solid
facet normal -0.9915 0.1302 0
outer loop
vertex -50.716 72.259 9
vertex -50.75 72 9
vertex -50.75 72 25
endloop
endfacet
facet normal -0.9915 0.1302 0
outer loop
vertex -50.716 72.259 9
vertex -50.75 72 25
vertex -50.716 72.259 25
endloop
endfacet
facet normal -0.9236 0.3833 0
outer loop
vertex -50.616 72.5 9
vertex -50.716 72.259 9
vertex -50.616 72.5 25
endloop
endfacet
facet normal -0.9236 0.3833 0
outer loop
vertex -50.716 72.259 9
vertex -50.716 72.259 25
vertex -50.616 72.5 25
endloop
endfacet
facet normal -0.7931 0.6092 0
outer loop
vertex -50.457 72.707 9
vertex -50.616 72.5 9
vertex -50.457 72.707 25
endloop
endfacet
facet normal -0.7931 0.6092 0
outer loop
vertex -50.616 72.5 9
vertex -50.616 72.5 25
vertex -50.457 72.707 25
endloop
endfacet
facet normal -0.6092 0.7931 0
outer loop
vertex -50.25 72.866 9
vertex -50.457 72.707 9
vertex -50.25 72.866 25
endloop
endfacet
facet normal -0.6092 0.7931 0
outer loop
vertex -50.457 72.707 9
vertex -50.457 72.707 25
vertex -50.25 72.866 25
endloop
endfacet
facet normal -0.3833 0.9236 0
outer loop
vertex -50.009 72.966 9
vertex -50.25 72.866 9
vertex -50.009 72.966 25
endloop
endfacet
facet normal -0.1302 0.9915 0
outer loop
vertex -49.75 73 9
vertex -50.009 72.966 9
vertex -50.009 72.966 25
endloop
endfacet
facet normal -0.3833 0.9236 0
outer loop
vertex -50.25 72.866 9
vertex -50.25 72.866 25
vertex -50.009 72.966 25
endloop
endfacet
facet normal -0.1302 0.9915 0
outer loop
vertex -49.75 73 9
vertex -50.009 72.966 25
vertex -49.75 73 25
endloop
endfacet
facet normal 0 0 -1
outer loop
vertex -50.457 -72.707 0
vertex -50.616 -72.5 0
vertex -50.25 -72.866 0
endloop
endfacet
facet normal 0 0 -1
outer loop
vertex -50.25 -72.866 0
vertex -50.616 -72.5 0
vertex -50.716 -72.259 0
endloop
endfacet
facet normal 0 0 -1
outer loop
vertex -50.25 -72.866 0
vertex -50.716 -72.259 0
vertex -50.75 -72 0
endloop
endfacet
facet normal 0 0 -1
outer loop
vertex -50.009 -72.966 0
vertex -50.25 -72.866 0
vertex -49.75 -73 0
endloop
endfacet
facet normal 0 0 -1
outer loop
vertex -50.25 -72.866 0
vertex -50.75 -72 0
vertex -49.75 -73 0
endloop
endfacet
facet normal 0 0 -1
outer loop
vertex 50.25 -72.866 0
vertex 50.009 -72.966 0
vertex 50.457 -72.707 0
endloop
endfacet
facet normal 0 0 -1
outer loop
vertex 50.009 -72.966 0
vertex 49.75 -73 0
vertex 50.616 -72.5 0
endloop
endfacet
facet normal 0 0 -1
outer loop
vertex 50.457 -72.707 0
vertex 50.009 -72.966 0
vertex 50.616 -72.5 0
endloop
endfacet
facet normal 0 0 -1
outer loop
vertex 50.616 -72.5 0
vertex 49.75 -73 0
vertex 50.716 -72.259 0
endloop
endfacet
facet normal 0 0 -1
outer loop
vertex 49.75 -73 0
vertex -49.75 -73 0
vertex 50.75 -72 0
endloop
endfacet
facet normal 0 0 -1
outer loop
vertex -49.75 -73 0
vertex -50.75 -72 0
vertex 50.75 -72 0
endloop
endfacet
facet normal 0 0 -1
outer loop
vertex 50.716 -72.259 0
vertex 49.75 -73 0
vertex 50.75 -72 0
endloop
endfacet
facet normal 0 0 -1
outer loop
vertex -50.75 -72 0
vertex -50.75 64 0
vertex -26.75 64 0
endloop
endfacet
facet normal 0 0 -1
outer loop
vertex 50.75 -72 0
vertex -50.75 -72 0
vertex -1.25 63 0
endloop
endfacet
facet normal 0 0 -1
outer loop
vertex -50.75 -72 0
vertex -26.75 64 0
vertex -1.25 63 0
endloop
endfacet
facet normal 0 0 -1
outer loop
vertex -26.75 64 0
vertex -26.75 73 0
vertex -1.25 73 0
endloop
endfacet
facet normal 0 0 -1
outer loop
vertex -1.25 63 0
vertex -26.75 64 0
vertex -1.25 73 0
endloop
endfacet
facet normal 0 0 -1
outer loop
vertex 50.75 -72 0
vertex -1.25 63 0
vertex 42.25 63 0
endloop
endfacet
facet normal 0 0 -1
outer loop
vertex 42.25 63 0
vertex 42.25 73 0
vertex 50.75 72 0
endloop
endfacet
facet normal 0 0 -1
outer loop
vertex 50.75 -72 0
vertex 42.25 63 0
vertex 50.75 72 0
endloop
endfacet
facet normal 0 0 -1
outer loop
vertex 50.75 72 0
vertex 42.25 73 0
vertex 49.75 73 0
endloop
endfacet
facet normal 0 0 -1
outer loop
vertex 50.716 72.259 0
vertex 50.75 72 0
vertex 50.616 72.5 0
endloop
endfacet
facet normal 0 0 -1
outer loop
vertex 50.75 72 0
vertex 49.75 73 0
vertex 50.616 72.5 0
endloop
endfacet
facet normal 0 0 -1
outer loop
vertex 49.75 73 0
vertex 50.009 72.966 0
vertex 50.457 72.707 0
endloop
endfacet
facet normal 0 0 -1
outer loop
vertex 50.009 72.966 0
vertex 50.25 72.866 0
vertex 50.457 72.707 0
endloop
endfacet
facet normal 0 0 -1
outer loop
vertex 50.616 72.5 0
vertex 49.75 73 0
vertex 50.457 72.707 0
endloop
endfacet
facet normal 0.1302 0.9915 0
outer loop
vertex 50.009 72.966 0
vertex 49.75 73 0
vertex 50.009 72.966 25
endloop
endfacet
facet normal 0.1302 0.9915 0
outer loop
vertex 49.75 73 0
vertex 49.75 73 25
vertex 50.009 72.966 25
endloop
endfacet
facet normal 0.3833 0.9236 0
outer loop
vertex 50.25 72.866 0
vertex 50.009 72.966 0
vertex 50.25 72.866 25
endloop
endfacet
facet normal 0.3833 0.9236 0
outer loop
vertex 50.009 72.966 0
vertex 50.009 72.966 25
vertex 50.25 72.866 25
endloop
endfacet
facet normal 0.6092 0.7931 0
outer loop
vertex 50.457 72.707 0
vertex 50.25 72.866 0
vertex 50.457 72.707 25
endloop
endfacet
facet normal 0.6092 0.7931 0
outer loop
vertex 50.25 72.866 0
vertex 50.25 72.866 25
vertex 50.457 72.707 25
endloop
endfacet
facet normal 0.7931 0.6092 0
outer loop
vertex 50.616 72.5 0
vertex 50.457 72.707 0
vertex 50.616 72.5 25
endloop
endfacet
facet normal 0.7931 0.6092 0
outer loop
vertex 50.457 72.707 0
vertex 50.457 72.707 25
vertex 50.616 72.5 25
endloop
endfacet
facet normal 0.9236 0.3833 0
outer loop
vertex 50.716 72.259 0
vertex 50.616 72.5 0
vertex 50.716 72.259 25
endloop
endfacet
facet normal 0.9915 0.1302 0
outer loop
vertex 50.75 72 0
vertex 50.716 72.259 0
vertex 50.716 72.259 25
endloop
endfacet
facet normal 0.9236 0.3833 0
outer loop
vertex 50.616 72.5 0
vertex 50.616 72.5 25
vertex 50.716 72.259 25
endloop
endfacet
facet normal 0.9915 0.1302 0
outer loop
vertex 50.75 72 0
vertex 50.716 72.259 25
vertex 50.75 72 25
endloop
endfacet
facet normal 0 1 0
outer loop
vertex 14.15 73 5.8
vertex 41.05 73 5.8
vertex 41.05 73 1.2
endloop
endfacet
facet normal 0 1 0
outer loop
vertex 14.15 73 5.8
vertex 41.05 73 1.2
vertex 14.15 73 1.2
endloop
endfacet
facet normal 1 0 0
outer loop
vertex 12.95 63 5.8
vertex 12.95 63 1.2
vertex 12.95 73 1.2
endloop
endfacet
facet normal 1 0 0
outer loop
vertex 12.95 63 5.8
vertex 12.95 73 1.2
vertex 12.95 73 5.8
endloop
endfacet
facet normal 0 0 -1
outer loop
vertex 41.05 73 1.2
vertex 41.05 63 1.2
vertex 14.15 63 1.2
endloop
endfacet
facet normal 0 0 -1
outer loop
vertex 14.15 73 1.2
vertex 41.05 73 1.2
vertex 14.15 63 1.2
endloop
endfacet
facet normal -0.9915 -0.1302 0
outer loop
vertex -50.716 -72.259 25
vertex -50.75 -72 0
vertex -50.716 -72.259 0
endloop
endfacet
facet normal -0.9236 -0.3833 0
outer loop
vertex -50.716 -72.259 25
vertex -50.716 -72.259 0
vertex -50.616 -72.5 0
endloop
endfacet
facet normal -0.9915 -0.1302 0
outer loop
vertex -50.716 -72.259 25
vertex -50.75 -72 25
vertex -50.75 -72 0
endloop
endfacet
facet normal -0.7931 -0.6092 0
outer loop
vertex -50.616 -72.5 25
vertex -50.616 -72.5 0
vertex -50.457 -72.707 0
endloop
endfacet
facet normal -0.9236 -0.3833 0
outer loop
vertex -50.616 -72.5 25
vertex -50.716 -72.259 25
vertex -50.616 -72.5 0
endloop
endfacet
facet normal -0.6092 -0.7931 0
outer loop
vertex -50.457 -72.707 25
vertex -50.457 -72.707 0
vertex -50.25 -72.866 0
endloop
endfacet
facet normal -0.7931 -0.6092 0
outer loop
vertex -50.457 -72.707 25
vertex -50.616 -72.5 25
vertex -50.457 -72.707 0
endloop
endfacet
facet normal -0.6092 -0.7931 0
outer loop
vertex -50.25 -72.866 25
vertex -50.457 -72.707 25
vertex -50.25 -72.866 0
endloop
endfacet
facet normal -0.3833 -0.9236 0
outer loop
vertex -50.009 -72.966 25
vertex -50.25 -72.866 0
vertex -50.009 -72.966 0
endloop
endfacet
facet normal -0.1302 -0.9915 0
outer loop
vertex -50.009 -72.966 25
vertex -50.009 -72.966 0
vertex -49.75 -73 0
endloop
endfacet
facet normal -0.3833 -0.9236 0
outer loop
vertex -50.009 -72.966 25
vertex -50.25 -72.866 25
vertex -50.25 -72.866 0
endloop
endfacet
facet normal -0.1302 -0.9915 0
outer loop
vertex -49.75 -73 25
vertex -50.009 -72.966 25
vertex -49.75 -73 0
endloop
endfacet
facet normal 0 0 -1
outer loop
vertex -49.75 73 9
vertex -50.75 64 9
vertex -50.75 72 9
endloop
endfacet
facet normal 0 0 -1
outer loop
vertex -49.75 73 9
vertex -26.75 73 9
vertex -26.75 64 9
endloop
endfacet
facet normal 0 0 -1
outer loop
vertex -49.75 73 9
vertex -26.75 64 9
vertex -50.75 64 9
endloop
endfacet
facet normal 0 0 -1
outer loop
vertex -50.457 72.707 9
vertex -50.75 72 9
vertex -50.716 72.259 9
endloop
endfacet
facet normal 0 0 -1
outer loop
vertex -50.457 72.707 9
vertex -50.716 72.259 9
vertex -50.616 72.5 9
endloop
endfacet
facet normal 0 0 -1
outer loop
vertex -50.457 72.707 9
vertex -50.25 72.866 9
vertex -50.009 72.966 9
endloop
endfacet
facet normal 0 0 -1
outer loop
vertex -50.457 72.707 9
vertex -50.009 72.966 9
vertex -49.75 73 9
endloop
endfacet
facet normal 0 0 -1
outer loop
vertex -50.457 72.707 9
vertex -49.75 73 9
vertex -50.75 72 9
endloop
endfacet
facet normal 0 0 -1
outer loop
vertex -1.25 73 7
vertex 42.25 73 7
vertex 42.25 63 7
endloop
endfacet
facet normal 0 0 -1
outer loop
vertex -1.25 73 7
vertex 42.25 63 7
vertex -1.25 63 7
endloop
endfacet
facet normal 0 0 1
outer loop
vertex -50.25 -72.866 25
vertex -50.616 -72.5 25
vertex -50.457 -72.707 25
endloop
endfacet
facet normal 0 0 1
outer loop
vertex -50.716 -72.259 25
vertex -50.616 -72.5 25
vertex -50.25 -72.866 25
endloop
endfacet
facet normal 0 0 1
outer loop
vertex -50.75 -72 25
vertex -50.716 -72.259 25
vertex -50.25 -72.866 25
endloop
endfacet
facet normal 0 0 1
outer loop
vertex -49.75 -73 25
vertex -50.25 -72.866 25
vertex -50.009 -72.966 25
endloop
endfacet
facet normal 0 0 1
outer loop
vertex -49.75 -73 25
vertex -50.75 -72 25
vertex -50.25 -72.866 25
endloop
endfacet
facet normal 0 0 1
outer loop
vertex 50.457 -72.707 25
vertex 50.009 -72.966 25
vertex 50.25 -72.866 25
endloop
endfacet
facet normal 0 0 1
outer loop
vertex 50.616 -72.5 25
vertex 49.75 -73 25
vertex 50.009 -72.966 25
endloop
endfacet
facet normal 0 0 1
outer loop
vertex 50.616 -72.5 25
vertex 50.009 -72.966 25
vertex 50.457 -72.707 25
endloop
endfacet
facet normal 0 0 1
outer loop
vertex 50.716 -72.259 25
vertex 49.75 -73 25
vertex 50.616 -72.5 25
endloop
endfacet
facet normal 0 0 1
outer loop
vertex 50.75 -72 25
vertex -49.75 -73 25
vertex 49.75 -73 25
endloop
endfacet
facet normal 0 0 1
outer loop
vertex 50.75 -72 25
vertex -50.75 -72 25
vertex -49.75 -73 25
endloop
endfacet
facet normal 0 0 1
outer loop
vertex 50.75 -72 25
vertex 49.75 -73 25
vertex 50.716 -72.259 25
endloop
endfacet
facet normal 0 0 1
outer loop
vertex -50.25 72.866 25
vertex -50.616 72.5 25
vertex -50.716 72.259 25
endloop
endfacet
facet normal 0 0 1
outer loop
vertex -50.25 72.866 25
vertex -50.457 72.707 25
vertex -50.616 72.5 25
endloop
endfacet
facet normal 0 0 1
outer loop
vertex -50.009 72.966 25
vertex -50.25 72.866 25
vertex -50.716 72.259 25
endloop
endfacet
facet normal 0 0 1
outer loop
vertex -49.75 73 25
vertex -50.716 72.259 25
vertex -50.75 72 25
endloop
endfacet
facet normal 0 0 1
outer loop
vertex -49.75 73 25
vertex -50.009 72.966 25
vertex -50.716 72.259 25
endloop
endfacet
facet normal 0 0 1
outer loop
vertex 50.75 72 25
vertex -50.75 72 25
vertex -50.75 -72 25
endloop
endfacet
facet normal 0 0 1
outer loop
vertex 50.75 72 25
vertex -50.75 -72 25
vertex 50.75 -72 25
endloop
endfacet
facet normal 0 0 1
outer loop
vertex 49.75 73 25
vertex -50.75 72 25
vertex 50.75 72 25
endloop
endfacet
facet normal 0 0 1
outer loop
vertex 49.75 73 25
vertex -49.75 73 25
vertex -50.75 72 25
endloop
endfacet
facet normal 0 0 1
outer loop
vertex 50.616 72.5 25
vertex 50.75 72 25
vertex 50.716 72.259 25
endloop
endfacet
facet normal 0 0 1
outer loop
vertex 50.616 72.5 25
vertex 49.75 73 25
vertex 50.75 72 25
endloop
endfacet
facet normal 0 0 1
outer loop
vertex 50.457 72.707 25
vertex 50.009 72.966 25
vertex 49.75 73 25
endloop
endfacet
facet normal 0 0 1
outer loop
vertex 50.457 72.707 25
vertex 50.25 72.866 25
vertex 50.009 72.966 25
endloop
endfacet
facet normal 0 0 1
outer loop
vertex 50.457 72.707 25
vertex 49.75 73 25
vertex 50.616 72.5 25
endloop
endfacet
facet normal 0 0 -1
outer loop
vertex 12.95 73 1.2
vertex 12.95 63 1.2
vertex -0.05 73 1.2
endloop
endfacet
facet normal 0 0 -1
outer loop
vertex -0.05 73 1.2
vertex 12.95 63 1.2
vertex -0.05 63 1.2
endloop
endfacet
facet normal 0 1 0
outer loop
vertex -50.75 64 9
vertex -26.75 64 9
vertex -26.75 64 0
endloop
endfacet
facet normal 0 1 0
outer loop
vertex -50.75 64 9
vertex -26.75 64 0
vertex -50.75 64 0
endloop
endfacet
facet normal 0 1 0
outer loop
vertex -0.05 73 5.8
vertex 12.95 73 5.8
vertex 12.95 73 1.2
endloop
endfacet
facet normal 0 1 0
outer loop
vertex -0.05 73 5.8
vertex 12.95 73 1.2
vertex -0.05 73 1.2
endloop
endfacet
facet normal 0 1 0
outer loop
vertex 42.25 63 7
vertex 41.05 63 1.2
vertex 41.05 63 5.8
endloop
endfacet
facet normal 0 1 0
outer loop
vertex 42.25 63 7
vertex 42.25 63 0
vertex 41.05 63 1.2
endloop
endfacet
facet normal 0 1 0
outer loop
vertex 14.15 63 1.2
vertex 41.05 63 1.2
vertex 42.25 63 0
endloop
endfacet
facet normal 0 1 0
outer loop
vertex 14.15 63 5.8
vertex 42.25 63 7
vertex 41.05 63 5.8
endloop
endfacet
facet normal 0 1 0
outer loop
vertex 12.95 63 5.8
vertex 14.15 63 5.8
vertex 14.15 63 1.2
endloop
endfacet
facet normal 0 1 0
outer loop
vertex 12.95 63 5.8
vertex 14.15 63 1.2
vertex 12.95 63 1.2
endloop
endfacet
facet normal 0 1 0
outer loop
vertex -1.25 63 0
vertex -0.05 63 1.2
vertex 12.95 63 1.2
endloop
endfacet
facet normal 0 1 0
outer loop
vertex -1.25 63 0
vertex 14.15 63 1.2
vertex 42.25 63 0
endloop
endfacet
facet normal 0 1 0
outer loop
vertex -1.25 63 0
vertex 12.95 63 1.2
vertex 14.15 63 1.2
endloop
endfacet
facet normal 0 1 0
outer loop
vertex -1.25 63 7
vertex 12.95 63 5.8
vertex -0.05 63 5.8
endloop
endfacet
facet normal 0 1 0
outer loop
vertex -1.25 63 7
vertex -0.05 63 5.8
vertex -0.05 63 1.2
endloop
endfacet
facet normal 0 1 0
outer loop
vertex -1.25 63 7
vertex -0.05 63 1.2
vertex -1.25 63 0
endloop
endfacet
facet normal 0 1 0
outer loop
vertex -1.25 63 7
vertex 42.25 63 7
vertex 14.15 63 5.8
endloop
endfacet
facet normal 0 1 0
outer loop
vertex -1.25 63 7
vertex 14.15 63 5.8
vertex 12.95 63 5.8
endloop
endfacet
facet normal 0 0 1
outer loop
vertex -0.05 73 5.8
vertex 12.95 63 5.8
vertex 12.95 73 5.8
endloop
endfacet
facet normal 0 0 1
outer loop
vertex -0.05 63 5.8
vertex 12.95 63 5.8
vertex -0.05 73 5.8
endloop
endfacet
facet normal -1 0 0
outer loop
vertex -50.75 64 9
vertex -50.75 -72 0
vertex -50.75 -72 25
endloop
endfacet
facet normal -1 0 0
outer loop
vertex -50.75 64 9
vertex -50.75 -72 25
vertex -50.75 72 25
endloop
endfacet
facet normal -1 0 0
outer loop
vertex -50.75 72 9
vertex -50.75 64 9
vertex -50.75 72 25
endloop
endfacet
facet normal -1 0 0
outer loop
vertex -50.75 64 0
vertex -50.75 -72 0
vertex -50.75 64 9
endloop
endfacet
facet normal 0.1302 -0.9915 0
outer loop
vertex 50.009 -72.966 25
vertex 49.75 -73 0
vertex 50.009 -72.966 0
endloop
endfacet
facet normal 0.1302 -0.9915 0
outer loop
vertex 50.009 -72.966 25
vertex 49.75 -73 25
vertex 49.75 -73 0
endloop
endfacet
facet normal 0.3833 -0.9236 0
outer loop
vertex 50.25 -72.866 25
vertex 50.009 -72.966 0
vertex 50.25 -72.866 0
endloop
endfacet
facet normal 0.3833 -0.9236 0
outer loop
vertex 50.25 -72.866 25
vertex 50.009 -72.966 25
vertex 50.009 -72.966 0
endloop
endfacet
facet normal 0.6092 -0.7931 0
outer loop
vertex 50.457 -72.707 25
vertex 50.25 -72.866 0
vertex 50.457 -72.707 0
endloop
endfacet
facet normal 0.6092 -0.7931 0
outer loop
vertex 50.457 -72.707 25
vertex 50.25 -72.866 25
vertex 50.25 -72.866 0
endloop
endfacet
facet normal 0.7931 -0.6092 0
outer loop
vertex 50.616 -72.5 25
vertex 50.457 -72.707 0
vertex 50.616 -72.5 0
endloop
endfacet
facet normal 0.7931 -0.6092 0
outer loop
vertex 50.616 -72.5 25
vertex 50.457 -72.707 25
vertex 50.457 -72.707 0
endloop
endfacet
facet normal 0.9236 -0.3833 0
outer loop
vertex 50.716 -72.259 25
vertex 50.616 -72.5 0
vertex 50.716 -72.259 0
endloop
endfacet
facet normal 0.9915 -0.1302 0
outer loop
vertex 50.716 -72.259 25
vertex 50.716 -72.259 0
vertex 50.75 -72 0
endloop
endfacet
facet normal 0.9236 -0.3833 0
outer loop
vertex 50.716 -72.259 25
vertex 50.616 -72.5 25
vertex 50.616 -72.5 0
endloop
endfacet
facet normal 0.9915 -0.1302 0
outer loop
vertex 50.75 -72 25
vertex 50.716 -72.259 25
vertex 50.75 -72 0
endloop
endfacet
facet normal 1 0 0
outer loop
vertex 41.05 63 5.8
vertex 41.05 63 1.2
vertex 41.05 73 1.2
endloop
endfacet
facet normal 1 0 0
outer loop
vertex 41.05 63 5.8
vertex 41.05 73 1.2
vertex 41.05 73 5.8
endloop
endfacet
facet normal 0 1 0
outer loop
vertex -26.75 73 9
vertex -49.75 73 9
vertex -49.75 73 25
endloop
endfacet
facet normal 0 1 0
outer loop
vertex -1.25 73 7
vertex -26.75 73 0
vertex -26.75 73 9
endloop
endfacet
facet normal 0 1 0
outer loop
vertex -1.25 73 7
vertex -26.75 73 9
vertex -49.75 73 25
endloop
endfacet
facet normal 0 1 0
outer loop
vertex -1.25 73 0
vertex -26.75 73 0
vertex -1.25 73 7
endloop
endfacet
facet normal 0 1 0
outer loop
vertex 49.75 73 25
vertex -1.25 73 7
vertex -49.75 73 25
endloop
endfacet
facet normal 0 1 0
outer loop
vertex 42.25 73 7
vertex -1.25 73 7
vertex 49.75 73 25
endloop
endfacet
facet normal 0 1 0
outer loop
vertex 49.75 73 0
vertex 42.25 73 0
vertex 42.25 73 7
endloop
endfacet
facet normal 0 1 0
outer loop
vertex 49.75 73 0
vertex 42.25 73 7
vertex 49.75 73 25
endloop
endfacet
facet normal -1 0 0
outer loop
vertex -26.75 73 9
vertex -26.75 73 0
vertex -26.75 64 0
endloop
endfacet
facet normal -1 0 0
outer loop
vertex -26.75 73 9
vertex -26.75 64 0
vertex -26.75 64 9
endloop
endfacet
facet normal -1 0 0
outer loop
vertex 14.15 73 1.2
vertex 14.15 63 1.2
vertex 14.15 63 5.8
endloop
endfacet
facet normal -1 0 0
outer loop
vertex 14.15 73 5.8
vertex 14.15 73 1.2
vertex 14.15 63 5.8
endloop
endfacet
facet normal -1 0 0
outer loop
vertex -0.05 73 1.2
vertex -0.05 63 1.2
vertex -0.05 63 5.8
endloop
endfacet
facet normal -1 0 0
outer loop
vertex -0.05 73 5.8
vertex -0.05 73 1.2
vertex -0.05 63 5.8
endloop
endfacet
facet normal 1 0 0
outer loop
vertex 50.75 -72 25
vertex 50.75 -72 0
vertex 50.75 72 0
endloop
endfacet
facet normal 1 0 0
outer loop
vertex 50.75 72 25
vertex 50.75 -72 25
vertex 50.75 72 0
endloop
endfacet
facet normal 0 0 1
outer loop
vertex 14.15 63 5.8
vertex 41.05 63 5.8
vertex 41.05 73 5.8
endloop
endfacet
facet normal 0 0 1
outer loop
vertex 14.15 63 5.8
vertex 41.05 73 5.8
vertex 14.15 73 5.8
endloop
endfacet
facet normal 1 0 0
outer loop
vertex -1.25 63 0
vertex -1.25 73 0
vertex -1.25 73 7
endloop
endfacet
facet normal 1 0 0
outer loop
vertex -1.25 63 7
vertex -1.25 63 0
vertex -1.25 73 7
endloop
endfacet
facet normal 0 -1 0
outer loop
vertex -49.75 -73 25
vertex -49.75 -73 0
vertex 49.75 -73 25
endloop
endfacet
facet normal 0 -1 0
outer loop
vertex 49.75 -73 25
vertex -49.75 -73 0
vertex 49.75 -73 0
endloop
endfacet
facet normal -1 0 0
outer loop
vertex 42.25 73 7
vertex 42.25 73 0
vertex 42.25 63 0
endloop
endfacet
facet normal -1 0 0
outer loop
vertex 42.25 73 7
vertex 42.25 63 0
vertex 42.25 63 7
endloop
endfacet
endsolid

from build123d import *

# Parameters (mm, degrees)
F0_W     = 101.5
F0_H     = 146
F1_DEPTH = 25
F2_W     = 24
F2_H     = 9
F3_DEPTH = 9
F4_R     = 1
F5_W     = 43.5
F5_H     = 7
F6_DEPTH = 10
F7_W     = 26.9
F7_H     = 4.6
F7_W_2   = 13
F8_DEPTH = 10


with BuildPart() as f1:
    # F0 (on Top) → F1 (new body)
    with BuildSketch(Plane.XY):
        Rectangle(F0_W, F0_H)
    extrude(amount=F1_DEPTH)

    # F2 (on face) → F3 (cut)
    with BuildSketch(Plane(origin=(0, 73, 0), x_dir=(-1, 0, 0), z_dir=(0, 1, 0))):
        with Locations((38.75, 4.5)):
            Rectangle(F2_W, F2_H)
    extrude(amount=-F3_DEPTH, mode=Mode.SUBTRACT)

    # F4
    f4_edges = [f1.edges().sort_by_distance(p)[0] for p in [
        (50.75, 73, 12.5),
        (-50.75, 73, 17),
        (-50.75, -73, 12.5),
        (50.75, -73, 12.5),
    ]]
    fillet(f4_edges, radius=F4_R)

    # F5 (on face) → F6 (cut)
    with BuildSketch(Plane(origin=(0, 73, 0), x_dir=(-1, 0, 0), z_dir=(0, 1, 0))):
        with Locations((-20.5, 3.5)):
            Rectangle(F5_W, F5_H)
    extrude(amount=-F6_DEPTH, mode=Mode.SUBTRACT)

    # F7 (on face) → F8 (join)
    with BuildSketch(Plane(origin=(0, 63, 0), x_dir=(-1, 0, 0), z_dir=(0, 1, 0))):
        with Locations((-27.6, 3.5)):
            Rectangle(F7_W, F7_H)
        with Locations((-6.45, 3.5)):
            Rectangle(F7_W_2, F7_H)
    extrude(amount=F8_DEPTH)


solid = f1.part
